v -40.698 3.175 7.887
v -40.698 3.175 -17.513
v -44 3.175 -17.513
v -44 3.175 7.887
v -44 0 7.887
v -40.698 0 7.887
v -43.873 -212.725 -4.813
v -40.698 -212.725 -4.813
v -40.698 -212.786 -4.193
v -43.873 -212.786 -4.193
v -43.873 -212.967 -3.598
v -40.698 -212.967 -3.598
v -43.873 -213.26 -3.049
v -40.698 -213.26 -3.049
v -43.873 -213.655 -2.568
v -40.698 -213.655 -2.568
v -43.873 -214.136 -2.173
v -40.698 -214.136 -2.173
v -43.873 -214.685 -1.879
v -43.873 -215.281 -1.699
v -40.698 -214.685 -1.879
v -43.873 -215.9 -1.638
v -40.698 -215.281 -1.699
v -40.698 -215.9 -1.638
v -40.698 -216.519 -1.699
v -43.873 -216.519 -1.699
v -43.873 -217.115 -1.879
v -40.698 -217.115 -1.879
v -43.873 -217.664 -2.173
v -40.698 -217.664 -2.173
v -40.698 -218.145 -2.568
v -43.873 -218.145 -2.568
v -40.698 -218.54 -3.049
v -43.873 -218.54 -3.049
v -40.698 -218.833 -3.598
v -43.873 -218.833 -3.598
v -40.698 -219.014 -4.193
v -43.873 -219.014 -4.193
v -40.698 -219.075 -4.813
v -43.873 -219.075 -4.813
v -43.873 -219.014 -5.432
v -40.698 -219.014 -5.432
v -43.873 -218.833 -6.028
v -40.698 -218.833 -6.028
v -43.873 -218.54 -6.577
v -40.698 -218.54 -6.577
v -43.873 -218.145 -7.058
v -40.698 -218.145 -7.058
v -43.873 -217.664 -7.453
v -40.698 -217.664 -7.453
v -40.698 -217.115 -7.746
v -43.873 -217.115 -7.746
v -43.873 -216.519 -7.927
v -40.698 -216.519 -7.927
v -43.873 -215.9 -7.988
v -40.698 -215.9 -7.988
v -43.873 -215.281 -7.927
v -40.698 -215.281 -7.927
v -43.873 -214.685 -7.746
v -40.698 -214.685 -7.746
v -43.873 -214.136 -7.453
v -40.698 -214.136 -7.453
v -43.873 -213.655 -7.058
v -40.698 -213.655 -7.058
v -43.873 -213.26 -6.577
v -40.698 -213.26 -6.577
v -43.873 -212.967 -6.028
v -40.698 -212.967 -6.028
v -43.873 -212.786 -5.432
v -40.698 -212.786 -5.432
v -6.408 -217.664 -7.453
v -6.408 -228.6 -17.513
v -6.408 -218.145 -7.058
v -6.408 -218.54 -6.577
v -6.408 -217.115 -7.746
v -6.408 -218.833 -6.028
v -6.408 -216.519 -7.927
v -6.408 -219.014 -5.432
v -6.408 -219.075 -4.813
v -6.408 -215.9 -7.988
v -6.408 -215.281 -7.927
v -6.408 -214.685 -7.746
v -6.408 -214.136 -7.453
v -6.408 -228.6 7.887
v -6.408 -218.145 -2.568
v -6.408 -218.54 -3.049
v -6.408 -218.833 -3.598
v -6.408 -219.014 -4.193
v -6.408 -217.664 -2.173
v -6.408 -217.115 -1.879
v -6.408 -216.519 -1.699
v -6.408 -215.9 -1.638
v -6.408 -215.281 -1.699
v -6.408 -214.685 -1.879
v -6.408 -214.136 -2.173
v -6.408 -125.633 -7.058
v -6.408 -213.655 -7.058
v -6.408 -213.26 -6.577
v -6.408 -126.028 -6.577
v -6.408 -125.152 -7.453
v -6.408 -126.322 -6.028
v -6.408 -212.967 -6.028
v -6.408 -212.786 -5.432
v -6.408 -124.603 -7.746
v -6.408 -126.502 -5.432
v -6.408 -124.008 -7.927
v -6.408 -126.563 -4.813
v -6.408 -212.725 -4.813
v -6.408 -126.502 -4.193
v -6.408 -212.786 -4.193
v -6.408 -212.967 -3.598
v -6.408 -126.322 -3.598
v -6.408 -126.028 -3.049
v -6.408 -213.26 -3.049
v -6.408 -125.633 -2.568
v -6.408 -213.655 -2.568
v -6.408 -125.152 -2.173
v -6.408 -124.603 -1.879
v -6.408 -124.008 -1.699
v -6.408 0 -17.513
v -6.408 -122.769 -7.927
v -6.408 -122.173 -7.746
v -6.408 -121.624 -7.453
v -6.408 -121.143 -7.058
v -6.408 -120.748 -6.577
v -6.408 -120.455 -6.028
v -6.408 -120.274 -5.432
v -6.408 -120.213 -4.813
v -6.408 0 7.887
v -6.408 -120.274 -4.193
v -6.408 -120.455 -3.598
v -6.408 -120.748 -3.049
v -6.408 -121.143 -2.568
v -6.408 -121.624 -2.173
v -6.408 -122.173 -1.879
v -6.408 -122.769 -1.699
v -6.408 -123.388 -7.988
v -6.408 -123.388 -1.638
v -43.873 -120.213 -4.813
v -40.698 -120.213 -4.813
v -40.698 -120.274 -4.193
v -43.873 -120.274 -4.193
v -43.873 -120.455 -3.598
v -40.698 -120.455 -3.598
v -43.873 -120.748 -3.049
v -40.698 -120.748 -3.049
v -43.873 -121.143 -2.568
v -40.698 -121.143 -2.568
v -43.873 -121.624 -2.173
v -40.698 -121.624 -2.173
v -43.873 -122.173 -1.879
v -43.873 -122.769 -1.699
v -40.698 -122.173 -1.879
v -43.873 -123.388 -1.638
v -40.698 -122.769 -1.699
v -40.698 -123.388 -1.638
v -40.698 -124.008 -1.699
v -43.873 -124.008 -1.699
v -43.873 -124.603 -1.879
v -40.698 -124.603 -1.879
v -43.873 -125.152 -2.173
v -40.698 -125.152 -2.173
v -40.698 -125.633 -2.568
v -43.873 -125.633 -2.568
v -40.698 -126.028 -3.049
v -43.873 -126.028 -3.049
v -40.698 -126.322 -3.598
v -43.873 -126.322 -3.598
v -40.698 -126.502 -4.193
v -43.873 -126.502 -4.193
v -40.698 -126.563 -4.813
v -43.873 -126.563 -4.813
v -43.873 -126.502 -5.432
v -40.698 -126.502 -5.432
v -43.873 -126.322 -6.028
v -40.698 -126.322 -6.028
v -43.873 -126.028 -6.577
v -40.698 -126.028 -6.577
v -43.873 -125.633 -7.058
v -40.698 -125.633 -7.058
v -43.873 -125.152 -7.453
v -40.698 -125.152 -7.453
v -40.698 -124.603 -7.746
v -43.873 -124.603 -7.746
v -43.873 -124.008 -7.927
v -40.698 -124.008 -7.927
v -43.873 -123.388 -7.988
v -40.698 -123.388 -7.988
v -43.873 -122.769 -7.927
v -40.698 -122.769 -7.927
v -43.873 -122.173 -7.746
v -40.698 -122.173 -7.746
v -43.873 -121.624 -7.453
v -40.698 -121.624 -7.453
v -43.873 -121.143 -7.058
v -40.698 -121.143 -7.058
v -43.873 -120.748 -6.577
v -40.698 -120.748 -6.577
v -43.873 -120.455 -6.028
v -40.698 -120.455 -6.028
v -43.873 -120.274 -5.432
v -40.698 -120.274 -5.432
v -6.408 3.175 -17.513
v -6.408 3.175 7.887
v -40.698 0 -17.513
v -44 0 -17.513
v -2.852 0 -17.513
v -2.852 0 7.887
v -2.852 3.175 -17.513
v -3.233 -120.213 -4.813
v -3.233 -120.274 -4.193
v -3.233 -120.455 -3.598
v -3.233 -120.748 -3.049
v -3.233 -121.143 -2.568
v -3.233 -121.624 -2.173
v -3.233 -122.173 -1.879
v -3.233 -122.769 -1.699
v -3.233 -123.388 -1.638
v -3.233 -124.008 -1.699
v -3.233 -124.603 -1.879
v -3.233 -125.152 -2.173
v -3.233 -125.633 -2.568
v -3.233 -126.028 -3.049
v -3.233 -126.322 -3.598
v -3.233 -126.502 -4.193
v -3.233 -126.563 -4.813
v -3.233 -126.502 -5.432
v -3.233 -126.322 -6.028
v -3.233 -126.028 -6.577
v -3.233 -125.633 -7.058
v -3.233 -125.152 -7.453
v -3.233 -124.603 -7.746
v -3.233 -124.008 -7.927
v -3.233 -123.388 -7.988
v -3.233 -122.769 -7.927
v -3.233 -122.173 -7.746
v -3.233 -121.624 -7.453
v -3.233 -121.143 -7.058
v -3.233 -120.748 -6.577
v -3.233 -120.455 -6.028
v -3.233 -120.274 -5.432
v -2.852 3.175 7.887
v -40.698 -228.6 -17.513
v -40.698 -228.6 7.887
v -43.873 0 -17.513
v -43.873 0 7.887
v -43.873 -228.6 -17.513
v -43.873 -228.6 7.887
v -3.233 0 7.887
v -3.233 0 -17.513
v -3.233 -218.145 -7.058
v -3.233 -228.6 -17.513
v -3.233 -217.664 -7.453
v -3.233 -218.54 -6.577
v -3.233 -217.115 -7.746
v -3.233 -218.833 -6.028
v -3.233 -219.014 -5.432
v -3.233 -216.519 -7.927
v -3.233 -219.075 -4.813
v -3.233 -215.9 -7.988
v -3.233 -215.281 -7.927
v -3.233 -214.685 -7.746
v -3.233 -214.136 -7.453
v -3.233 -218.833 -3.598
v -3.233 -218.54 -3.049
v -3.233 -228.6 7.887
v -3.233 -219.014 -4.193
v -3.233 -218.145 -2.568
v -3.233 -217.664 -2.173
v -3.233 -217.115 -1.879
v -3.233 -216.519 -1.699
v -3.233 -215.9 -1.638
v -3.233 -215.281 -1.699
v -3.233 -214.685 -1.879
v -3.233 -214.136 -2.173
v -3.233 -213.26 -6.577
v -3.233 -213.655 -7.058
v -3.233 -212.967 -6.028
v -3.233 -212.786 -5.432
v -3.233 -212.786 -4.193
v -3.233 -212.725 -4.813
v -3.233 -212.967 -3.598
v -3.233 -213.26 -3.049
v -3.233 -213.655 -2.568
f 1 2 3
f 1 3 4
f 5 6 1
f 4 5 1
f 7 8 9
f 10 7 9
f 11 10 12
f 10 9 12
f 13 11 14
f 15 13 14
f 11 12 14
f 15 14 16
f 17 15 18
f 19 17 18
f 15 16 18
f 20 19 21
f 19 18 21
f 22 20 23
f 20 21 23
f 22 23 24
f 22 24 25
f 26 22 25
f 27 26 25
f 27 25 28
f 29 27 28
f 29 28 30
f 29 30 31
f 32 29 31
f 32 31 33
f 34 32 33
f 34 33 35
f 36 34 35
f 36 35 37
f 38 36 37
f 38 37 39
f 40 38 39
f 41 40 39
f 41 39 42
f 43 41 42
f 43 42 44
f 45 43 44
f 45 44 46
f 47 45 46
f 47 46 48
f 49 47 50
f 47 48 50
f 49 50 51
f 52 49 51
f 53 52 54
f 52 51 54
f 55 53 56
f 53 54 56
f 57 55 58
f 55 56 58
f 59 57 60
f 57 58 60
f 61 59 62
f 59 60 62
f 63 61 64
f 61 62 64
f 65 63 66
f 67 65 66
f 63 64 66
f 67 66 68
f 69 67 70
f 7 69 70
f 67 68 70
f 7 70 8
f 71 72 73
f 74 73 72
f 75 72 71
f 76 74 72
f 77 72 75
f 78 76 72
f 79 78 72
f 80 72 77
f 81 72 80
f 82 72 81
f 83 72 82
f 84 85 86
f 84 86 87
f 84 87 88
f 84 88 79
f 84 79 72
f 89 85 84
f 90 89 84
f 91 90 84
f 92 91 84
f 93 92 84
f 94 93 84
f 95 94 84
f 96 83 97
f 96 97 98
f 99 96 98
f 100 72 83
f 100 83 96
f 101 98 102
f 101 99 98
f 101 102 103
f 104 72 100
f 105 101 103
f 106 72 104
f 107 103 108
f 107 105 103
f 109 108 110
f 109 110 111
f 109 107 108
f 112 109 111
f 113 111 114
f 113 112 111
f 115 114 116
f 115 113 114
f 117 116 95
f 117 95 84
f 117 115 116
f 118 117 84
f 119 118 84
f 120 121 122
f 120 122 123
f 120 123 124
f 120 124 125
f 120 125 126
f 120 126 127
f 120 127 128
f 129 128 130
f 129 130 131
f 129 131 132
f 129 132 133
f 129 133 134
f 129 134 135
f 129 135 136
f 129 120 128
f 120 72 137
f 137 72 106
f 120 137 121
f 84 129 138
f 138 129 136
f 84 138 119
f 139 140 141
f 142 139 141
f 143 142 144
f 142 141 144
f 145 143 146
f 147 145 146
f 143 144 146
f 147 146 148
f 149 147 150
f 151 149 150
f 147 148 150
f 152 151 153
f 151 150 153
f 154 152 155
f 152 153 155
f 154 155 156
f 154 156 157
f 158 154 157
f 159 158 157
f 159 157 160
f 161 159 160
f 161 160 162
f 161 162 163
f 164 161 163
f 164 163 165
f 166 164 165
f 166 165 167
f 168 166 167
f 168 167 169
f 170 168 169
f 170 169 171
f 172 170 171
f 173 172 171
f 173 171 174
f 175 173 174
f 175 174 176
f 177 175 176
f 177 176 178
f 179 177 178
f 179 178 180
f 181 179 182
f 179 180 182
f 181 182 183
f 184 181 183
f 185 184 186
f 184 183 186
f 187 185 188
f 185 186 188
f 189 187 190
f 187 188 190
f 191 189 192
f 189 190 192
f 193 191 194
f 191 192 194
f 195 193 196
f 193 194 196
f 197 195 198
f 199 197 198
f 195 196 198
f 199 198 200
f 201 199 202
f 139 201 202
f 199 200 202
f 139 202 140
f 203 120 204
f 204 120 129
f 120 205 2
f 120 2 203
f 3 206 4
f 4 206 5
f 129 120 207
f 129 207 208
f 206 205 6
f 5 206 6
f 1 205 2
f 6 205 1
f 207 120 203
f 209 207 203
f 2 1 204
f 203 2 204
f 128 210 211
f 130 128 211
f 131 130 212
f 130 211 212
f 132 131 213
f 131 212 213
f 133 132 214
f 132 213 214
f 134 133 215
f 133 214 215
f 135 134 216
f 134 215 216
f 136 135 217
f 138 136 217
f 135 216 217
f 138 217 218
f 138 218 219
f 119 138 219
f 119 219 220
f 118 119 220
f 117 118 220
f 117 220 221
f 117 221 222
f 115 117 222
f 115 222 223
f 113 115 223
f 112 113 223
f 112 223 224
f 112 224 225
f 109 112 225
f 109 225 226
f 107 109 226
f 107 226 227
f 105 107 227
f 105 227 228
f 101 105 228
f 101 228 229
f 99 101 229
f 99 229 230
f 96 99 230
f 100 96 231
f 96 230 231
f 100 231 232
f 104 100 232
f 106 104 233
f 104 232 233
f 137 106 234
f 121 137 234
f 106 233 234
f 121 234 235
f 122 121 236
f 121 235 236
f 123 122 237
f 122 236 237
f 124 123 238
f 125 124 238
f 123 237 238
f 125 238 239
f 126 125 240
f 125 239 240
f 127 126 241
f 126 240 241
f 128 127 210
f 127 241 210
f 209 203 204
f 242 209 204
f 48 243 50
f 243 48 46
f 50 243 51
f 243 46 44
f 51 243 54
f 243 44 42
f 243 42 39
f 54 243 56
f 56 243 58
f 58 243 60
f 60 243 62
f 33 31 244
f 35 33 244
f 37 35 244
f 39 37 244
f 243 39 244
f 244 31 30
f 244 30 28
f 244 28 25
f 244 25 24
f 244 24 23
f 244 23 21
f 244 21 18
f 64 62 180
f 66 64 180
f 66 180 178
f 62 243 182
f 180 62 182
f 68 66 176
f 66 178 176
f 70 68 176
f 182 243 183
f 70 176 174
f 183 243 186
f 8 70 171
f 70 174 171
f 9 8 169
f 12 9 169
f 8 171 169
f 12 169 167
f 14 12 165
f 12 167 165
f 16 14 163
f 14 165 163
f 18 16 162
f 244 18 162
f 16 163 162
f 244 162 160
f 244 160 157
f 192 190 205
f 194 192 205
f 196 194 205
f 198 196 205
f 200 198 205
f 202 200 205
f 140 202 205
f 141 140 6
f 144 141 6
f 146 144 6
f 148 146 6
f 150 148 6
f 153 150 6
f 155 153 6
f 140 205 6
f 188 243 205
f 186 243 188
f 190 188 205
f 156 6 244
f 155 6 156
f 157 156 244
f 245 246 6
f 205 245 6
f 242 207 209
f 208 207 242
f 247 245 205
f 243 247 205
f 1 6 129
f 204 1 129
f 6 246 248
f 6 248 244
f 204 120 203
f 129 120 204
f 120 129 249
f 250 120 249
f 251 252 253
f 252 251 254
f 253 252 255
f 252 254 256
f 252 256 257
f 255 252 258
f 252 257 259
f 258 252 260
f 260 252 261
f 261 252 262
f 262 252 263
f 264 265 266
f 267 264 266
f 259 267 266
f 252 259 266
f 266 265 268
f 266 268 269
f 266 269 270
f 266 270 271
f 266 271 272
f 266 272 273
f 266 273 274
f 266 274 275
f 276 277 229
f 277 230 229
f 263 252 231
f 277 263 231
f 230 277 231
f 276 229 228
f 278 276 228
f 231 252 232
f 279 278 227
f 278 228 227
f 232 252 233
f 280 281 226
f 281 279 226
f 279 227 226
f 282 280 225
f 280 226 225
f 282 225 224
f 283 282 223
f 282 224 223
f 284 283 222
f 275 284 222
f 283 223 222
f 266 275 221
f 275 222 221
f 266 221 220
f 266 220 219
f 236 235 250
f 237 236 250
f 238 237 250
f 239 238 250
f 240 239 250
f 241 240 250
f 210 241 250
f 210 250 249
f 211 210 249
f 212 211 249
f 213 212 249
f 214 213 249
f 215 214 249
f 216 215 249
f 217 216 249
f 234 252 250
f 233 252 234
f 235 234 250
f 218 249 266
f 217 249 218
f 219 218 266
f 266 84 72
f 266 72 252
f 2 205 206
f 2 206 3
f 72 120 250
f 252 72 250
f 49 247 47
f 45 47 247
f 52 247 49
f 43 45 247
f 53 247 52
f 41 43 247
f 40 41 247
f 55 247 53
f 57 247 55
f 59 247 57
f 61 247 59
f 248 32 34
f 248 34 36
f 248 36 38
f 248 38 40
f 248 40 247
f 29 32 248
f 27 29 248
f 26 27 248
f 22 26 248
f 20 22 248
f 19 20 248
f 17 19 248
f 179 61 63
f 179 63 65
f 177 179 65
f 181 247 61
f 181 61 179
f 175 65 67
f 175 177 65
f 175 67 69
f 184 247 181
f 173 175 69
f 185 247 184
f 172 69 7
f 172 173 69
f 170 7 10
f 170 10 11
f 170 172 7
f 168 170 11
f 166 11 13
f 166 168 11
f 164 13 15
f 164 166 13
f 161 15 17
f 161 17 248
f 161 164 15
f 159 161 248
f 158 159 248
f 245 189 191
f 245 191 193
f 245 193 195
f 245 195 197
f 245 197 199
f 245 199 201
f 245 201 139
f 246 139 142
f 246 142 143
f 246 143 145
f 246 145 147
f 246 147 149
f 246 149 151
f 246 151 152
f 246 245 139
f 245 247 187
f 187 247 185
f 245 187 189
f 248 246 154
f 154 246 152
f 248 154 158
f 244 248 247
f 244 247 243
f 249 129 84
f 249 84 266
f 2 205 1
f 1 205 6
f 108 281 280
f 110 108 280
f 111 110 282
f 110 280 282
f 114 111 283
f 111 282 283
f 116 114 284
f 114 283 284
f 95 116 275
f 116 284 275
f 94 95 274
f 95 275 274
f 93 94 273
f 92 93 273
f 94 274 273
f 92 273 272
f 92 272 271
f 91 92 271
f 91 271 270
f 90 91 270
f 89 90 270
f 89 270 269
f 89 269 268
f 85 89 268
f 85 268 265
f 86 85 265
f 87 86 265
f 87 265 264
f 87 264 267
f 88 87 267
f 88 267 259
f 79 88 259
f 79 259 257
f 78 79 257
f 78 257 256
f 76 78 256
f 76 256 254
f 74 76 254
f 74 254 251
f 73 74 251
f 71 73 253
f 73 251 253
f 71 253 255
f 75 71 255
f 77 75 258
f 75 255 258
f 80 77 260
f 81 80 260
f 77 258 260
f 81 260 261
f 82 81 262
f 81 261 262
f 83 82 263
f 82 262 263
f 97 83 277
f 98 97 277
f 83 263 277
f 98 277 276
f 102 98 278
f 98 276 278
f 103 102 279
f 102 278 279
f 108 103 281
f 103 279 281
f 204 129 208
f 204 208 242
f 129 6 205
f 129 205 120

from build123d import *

# Parameters (mm, degrees)
F0_W     = 3.175
F0_H     = 25.4
F1_DEPTH = 228.6
F2_DEPTH = 228.6
F0_W_2   = 34.29
F3_DEPTH = 3.175
F4_DEPTH = 3.556
F5_DEPTH = 3.302
F6_R     = 3.175
F7_DEPTH = 40.768


with BuildPart() as f1:
    # F0 (on Front) → F1 (new body)
    with BuildSketch(Plane.XZ):
        with Locations((-42.2859862377, -4.8126317561)):
            Rectangle(F0_W, F0_H)
    extrude(amount=F1_DEPTH)


with BuildPart() as f2:
    # F0 (on Front) → F2 (new body)
    with BuildSketch(Plane.XZ):
        with Locations((-4.8209862377, -4.8126317561)):
            Rectangle(F0_W, F0_H)
    extrude(amount=F2_DEPTH)


with BuildPart() as f3:
    # F0 (on Front) → F3 (new body)
    with BuildSketch(Plane.XZ):
        with Locations((-23.5534862377, -4.8126317561)):
            Rectangle(F0_W_2, F0_H)
    extrude(amount=-F3_DEPTH)


with BuildPart() as f4:
    # F4 (new): a face of the model
    f4_faces = [f3.part.faces().sort_by_distance(p)[0] for p in [
        (-6.4084862377, 1.5875, -4.8126317561),
    ]]
    extrude(f4_faces, amount=F4_DEPTH)


with BuildPart() as f5:
    # F5 (new): a face of the model
    f5_faces = [f3.part.faces().sort_by_distance(p)[0] for p in [
        (-40.6984862377, 1.5875, -4.8126317561),
    ]]
    extrude(f5_faces, amount=F5_DEPTH)


with BuildPart() as f7_tool:
    # F6 (on face) → F7 (new body, through all)
    with BuildSketch(Plane.YZ.offset(-3.2334862377)):
        with Locations((-123.3883351088, -4.8126317561)):
            Circle(F6_R)
        with Locations((-215.9, -4.8126317561)):
            Circle(F6_R)
    extrude(amount=-F7_DEPTH)


with BuildPart() as f1_1:
    add(f1.part)

    # F7: cut by f7_tool
    add(f7_tool.part, mode=Mode.SUBTRACT)


with BuildPart() as f2_1:
    add(f2.part)

    # F7: cut by f7_tool
    add(f7_tool.part, mode=Mode.SUBTRACT)


solid = Compound([f3.part, f4.part, f5.part, f1_1.part, f2_1.part])
